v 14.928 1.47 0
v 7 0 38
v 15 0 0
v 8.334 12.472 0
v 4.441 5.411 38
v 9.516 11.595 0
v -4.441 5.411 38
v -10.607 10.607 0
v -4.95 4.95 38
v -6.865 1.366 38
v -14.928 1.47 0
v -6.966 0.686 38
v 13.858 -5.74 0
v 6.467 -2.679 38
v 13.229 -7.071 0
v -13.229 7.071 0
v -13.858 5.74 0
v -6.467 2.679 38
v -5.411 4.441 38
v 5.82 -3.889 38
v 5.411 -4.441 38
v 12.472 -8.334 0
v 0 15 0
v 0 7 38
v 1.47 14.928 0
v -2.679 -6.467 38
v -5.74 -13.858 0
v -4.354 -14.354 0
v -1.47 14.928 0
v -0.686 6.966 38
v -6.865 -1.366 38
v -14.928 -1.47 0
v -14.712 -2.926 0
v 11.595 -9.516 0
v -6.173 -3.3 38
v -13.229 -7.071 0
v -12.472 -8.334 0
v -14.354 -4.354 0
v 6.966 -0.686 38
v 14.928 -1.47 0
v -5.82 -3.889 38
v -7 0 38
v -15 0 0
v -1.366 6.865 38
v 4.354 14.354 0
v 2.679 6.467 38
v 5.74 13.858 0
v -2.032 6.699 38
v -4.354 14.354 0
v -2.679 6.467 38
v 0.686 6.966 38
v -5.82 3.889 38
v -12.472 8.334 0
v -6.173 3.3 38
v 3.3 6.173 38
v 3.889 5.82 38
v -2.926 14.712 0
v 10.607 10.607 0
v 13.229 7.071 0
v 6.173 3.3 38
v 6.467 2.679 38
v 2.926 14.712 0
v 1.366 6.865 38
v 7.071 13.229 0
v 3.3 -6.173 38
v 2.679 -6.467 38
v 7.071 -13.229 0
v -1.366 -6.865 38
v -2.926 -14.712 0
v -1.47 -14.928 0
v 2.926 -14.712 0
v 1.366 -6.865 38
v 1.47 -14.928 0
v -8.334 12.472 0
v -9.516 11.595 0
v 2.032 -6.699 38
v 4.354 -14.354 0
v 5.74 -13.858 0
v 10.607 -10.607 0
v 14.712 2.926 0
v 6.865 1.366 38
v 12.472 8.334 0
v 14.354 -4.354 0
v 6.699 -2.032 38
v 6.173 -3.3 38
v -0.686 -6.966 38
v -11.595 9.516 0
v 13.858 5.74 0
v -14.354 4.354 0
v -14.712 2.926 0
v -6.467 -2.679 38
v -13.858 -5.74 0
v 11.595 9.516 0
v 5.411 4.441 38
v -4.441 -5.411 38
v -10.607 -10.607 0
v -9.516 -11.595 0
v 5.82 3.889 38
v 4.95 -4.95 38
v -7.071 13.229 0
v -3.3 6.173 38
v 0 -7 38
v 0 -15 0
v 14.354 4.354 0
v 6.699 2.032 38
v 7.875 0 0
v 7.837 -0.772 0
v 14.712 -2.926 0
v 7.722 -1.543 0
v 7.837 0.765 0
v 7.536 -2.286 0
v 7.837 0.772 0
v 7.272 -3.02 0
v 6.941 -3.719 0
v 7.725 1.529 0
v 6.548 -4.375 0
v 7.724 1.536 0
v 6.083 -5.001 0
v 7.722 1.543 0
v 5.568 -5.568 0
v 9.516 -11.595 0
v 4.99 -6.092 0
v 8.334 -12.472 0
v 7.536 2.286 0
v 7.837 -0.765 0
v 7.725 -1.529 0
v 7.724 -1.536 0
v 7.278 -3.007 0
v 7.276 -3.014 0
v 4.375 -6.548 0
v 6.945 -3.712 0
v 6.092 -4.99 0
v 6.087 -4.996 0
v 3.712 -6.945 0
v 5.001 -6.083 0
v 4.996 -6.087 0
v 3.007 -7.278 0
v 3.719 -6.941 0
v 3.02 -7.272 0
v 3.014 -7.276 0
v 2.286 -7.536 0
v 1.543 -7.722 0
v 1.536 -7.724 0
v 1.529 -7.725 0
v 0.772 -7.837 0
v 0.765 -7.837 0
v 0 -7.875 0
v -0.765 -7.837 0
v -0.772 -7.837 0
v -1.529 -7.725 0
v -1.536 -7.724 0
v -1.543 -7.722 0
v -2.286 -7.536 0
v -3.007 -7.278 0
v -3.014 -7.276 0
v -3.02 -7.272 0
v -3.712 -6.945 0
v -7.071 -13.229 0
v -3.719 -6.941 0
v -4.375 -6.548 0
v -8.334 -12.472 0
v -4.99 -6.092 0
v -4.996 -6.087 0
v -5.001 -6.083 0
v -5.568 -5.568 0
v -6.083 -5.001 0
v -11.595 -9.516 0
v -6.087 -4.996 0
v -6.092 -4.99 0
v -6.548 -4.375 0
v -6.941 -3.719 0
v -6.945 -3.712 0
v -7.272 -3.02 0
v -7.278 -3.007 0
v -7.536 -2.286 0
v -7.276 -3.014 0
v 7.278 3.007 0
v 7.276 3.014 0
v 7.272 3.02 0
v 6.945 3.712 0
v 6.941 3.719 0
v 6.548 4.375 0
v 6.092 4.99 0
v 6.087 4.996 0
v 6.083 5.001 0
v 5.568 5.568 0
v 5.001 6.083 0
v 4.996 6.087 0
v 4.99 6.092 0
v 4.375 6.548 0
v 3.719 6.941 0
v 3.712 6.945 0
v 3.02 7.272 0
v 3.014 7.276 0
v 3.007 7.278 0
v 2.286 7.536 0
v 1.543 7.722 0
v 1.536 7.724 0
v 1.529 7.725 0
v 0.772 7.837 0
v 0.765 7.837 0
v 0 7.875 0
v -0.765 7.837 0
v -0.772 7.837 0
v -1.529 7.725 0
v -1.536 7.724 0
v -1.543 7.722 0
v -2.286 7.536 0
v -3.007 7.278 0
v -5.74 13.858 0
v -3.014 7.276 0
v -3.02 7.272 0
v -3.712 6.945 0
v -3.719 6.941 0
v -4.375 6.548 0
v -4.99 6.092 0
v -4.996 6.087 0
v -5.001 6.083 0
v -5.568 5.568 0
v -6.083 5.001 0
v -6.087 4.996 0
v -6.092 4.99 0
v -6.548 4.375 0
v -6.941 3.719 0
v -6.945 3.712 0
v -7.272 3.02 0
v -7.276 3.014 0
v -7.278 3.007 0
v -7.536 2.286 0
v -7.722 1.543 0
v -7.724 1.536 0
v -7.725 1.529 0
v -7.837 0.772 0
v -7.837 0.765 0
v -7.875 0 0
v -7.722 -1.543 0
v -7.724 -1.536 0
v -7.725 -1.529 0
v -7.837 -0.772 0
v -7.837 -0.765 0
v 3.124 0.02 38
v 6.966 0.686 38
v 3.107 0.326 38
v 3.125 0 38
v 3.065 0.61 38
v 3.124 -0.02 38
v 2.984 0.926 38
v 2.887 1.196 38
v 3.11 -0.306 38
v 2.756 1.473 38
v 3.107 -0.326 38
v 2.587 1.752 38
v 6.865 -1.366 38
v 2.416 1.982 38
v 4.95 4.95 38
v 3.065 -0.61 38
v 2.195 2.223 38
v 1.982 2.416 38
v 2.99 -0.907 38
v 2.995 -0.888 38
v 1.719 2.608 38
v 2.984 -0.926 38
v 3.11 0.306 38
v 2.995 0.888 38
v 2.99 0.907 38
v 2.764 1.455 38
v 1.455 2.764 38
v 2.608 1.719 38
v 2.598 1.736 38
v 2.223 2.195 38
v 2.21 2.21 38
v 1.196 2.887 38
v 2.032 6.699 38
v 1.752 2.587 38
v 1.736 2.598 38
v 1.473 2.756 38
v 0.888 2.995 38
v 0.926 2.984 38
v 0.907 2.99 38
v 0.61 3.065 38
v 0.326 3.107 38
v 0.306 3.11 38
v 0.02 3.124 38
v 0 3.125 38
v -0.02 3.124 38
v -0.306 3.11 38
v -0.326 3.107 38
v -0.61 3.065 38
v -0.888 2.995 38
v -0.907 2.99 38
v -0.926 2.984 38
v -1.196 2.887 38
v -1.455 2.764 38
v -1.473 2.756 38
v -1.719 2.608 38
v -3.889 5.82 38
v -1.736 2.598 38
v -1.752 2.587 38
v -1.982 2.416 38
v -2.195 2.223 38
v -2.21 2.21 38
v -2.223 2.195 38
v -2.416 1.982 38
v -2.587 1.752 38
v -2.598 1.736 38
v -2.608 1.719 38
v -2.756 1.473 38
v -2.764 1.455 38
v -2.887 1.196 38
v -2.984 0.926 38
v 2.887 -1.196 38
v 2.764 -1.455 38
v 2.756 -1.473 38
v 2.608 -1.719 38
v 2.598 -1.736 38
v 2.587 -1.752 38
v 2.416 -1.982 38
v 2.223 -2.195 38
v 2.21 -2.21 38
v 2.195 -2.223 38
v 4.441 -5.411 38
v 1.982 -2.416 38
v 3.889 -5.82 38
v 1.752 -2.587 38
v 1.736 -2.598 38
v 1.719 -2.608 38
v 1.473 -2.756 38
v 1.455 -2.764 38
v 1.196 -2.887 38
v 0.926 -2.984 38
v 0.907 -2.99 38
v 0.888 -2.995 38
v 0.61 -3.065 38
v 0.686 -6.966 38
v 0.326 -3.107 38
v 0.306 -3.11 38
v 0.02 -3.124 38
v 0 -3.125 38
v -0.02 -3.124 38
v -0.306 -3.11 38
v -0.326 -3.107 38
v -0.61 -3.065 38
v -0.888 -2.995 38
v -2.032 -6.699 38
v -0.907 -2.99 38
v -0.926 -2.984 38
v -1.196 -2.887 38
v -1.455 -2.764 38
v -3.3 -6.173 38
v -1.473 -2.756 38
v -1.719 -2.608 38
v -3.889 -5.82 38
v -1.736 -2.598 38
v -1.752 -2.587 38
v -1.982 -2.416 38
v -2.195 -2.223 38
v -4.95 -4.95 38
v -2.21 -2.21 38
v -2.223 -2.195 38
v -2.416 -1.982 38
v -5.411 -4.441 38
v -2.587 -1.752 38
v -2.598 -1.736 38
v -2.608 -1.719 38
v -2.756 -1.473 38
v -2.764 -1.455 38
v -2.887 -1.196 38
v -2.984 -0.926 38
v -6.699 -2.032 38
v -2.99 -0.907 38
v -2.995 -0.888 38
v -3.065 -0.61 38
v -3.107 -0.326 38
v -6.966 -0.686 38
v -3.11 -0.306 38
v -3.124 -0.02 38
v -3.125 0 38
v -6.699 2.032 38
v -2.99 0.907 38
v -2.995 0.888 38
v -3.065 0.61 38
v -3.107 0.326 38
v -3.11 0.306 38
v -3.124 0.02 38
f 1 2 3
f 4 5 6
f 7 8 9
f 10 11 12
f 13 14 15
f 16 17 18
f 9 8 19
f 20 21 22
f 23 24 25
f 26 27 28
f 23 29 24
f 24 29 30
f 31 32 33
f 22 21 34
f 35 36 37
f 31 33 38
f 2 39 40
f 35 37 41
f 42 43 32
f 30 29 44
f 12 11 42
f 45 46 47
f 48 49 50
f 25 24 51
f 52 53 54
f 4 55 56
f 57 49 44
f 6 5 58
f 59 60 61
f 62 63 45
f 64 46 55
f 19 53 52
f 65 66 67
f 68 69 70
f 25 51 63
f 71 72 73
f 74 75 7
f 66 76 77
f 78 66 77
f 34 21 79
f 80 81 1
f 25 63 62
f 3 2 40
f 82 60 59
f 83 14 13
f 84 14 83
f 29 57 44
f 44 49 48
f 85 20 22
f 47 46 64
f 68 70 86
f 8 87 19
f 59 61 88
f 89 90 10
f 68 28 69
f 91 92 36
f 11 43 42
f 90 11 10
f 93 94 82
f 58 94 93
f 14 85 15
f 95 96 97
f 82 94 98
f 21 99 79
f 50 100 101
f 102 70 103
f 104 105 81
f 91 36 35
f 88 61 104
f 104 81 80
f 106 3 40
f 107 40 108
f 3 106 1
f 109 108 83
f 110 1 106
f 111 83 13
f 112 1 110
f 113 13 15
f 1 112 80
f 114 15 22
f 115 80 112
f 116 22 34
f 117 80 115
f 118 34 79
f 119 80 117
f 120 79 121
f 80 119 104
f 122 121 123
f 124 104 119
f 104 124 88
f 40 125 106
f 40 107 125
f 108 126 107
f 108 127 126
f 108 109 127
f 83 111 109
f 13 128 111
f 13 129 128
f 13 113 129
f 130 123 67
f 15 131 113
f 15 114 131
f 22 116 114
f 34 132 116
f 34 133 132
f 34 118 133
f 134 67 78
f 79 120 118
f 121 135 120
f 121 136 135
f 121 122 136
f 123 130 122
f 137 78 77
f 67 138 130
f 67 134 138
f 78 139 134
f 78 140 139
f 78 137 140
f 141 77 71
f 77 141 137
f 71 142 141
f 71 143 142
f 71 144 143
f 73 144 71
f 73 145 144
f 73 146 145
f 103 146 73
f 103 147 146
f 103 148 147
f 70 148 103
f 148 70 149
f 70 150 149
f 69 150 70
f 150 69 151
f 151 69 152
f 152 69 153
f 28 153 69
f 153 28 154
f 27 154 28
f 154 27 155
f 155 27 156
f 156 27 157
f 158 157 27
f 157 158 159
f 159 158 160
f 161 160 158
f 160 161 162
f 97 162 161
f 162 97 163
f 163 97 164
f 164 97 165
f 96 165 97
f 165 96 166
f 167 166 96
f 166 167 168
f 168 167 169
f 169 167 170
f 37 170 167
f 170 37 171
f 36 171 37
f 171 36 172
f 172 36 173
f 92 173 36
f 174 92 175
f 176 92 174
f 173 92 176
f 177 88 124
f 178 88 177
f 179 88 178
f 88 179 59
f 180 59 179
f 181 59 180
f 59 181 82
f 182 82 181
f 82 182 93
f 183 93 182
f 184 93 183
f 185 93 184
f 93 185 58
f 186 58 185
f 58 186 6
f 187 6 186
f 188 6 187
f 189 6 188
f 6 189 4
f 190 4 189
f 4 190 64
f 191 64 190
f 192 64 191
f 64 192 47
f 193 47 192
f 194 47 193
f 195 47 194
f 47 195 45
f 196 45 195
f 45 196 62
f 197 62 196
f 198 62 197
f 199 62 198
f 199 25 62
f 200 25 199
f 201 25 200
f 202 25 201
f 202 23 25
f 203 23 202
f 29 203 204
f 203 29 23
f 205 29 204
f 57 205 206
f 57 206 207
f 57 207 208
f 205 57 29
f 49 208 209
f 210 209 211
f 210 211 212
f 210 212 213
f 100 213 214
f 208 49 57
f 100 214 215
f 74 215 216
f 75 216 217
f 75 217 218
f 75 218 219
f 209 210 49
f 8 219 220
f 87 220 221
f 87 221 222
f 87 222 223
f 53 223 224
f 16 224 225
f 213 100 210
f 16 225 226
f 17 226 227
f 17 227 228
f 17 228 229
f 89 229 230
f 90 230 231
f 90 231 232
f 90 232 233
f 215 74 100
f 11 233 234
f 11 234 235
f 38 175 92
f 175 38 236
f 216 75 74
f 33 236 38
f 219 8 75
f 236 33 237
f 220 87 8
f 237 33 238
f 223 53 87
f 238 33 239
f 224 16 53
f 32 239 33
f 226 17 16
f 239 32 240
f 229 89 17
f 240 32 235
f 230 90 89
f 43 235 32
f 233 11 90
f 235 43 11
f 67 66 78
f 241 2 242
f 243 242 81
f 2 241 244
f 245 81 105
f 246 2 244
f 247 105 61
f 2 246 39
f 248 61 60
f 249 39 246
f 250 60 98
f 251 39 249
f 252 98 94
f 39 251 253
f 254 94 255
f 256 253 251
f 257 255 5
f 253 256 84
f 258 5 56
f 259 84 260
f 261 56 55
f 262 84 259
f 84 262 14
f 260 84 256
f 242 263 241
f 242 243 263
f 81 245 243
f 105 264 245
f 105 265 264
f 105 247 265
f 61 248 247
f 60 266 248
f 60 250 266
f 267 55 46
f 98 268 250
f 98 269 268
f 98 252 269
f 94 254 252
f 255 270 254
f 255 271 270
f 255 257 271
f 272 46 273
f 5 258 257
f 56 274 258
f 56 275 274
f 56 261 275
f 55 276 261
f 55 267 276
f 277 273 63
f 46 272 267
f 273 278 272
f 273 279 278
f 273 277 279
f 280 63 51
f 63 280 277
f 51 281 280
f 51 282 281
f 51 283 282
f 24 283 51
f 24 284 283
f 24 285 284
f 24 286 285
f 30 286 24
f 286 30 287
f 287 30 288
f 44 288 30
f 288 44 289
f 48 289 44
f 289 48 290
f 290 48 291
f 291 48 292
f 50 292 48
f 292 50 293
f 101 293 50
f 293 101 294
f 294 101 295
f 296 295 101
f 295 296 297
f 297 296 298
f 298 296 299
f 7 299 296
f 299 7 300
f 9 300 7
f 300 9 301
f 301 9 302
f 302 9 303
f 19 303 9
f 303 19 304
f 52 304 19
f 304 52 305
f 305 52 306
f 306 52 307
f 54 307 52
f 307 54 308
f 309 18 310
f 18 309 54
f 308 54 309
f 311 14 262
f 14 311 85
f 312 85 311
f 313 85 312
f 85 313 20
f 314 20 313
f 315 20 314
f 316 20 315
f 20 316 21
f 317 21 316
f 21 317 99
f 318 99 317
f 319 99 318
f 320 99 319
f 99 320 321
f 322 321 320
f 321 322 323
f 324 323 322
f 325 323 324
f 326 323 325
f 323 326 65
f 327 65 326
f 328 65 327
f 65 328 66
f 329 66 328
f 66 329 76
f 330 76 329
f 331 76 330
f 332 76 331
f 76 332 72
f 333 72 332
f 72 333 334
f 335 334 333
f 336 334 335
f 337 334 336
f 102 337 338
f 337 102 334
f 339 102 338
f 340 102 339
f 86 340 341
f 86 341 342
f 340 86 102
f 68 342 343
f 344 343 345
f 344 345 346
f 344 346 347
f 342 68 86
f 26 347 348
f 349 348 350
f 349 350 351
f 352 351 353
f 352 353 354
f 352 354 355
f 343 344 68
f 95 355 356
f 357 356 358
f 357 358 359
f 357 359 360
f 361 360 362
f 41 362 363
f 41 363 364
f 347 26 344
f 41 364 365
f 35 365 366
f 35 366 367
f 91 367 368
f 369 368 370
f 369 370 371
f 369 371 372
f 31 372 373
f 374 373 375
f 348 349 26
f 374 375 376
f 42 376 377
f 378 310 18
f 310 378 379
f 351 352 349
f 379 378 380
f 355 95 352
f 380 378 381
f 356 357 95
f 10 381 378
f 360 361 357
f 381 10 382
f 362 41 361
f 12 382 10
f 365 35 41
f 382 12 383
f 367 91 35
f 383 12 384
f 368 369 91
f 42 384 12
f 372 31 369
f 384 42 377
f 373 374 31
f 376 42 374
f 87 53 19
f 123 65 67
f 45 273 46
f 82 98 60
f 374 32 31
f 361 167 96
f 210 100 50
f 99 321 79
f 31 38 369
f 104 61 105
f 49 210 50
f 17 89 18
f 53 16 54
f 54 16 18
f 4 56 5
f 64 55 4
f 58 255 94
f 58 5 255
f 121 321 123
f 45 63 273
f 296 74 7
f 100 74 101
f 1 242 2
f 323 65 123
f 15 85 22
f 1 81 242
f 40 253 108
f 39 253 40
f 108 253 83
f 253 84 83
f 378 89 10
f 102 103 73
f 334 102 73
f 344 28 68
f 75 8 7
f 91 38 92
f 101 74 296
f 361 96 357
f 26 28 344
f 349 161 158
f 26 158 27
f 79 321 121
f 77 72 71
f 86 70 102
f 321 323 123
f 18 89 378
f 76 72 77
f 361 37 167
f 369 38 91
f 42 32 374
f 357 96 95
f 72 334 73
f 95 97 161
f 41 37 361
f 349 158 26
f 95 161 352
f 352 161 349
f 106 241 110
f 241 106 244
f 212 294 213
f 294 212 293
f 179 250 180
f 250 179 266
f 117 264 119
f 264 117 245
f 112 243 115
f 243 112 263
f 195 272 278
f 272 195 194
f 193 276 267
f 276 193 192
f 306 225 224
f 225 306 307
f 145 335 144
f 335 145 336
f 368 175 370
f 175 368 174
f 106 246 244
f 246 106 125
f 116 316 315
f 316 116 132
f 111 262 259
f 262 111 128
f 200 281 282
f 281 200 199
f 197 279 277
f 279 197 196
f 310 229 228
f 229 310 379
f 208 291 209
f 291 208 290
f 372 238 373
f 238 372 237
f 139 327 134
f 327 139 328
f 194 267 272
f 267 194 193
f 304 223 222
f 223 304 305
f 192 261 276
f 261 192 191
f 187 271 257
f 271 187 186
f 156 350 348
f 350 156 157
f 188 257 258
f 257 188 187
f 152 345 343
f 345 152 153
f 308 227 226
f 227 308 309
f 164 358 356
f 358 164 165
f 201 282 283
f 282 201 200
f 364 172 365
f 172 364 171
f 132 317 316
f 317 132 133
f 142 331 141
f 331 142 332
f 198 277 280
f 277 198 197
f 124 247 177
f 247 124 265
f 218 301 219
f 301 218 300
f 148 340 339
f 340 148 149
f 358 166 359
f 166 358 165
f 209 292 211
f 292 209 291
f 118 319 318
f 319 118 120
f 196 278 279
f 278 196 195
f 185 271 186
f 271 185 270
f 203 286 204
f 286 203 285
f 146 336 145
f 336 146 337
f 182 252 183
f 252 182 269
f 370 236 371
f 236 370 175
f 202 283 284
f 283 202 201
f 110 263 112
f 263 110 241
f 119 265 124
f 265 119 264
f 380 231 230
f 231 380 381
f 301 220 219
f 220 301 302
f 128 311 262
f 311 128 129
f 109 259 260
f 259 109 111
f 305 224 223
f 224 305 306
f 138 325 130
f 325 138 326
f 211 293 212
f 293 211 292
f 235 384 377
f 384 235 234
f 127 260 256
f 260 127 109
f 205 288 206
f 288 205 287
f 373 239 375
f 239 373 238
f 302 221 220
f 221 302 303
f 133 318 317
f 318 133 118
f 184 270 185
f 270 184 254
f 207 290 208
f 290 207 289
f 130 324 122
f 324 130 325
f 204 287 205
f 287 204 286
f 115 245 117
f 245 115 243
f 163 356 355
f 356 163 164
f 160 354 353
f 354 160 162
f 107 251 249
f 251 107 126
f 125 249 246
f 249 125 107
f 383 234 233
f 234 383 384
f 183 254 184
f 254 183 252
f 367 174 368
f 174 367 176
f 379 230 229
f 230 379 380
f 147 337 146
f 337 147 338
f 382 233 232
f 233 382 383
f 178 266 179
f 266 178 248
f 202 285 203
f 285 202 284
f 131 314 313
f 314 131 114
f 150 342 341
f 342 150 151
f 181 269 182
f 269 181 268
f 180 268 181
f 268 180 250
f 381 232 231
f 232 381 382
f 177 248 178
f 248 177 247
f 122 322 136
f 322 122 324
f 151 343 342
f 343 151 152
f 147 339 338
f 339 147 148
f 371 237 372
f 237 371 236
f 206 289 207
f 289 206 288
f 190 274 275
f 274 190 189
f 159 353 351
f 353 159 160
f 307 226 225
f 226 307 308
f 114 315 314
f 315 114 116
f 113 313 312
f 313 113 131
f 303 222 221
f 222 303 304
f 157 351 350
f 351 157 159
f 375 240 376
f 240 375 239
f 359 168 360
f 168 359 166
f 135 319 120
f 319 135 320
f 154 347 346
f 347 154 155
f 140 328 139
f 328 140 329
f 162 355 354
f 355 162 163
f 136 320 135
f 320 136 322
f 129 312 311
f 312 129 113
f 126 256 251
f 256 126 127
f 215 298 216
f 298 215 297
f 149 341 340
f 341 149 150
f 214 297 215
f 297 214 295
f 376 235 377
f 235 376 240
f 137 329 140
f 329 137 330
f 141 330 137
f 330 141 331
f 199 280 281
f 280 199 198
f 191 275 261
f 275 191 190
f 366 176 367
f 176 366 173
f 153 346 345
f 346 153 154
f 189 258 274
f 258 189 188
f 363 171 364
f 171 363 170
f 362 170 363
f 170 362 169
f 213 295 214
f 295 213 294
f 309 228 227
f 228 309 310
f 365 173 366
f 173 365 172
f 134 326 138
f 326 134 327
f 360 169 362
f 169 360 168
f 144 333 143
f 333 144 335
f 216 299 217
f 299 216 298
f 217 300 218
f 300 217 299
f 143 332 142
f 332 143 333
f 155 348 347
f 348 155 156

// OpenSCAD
// Generated with SolidPython2 for OpenSCAD task-012
$fn = 64;

difference() {
	cylinder(h = 38, r1 = 15, r2 = 7);
	translate(v = [0, 0, -1]) {
		cylinder(h = 40, r1 = 8, r2 = 3);
	}
}
